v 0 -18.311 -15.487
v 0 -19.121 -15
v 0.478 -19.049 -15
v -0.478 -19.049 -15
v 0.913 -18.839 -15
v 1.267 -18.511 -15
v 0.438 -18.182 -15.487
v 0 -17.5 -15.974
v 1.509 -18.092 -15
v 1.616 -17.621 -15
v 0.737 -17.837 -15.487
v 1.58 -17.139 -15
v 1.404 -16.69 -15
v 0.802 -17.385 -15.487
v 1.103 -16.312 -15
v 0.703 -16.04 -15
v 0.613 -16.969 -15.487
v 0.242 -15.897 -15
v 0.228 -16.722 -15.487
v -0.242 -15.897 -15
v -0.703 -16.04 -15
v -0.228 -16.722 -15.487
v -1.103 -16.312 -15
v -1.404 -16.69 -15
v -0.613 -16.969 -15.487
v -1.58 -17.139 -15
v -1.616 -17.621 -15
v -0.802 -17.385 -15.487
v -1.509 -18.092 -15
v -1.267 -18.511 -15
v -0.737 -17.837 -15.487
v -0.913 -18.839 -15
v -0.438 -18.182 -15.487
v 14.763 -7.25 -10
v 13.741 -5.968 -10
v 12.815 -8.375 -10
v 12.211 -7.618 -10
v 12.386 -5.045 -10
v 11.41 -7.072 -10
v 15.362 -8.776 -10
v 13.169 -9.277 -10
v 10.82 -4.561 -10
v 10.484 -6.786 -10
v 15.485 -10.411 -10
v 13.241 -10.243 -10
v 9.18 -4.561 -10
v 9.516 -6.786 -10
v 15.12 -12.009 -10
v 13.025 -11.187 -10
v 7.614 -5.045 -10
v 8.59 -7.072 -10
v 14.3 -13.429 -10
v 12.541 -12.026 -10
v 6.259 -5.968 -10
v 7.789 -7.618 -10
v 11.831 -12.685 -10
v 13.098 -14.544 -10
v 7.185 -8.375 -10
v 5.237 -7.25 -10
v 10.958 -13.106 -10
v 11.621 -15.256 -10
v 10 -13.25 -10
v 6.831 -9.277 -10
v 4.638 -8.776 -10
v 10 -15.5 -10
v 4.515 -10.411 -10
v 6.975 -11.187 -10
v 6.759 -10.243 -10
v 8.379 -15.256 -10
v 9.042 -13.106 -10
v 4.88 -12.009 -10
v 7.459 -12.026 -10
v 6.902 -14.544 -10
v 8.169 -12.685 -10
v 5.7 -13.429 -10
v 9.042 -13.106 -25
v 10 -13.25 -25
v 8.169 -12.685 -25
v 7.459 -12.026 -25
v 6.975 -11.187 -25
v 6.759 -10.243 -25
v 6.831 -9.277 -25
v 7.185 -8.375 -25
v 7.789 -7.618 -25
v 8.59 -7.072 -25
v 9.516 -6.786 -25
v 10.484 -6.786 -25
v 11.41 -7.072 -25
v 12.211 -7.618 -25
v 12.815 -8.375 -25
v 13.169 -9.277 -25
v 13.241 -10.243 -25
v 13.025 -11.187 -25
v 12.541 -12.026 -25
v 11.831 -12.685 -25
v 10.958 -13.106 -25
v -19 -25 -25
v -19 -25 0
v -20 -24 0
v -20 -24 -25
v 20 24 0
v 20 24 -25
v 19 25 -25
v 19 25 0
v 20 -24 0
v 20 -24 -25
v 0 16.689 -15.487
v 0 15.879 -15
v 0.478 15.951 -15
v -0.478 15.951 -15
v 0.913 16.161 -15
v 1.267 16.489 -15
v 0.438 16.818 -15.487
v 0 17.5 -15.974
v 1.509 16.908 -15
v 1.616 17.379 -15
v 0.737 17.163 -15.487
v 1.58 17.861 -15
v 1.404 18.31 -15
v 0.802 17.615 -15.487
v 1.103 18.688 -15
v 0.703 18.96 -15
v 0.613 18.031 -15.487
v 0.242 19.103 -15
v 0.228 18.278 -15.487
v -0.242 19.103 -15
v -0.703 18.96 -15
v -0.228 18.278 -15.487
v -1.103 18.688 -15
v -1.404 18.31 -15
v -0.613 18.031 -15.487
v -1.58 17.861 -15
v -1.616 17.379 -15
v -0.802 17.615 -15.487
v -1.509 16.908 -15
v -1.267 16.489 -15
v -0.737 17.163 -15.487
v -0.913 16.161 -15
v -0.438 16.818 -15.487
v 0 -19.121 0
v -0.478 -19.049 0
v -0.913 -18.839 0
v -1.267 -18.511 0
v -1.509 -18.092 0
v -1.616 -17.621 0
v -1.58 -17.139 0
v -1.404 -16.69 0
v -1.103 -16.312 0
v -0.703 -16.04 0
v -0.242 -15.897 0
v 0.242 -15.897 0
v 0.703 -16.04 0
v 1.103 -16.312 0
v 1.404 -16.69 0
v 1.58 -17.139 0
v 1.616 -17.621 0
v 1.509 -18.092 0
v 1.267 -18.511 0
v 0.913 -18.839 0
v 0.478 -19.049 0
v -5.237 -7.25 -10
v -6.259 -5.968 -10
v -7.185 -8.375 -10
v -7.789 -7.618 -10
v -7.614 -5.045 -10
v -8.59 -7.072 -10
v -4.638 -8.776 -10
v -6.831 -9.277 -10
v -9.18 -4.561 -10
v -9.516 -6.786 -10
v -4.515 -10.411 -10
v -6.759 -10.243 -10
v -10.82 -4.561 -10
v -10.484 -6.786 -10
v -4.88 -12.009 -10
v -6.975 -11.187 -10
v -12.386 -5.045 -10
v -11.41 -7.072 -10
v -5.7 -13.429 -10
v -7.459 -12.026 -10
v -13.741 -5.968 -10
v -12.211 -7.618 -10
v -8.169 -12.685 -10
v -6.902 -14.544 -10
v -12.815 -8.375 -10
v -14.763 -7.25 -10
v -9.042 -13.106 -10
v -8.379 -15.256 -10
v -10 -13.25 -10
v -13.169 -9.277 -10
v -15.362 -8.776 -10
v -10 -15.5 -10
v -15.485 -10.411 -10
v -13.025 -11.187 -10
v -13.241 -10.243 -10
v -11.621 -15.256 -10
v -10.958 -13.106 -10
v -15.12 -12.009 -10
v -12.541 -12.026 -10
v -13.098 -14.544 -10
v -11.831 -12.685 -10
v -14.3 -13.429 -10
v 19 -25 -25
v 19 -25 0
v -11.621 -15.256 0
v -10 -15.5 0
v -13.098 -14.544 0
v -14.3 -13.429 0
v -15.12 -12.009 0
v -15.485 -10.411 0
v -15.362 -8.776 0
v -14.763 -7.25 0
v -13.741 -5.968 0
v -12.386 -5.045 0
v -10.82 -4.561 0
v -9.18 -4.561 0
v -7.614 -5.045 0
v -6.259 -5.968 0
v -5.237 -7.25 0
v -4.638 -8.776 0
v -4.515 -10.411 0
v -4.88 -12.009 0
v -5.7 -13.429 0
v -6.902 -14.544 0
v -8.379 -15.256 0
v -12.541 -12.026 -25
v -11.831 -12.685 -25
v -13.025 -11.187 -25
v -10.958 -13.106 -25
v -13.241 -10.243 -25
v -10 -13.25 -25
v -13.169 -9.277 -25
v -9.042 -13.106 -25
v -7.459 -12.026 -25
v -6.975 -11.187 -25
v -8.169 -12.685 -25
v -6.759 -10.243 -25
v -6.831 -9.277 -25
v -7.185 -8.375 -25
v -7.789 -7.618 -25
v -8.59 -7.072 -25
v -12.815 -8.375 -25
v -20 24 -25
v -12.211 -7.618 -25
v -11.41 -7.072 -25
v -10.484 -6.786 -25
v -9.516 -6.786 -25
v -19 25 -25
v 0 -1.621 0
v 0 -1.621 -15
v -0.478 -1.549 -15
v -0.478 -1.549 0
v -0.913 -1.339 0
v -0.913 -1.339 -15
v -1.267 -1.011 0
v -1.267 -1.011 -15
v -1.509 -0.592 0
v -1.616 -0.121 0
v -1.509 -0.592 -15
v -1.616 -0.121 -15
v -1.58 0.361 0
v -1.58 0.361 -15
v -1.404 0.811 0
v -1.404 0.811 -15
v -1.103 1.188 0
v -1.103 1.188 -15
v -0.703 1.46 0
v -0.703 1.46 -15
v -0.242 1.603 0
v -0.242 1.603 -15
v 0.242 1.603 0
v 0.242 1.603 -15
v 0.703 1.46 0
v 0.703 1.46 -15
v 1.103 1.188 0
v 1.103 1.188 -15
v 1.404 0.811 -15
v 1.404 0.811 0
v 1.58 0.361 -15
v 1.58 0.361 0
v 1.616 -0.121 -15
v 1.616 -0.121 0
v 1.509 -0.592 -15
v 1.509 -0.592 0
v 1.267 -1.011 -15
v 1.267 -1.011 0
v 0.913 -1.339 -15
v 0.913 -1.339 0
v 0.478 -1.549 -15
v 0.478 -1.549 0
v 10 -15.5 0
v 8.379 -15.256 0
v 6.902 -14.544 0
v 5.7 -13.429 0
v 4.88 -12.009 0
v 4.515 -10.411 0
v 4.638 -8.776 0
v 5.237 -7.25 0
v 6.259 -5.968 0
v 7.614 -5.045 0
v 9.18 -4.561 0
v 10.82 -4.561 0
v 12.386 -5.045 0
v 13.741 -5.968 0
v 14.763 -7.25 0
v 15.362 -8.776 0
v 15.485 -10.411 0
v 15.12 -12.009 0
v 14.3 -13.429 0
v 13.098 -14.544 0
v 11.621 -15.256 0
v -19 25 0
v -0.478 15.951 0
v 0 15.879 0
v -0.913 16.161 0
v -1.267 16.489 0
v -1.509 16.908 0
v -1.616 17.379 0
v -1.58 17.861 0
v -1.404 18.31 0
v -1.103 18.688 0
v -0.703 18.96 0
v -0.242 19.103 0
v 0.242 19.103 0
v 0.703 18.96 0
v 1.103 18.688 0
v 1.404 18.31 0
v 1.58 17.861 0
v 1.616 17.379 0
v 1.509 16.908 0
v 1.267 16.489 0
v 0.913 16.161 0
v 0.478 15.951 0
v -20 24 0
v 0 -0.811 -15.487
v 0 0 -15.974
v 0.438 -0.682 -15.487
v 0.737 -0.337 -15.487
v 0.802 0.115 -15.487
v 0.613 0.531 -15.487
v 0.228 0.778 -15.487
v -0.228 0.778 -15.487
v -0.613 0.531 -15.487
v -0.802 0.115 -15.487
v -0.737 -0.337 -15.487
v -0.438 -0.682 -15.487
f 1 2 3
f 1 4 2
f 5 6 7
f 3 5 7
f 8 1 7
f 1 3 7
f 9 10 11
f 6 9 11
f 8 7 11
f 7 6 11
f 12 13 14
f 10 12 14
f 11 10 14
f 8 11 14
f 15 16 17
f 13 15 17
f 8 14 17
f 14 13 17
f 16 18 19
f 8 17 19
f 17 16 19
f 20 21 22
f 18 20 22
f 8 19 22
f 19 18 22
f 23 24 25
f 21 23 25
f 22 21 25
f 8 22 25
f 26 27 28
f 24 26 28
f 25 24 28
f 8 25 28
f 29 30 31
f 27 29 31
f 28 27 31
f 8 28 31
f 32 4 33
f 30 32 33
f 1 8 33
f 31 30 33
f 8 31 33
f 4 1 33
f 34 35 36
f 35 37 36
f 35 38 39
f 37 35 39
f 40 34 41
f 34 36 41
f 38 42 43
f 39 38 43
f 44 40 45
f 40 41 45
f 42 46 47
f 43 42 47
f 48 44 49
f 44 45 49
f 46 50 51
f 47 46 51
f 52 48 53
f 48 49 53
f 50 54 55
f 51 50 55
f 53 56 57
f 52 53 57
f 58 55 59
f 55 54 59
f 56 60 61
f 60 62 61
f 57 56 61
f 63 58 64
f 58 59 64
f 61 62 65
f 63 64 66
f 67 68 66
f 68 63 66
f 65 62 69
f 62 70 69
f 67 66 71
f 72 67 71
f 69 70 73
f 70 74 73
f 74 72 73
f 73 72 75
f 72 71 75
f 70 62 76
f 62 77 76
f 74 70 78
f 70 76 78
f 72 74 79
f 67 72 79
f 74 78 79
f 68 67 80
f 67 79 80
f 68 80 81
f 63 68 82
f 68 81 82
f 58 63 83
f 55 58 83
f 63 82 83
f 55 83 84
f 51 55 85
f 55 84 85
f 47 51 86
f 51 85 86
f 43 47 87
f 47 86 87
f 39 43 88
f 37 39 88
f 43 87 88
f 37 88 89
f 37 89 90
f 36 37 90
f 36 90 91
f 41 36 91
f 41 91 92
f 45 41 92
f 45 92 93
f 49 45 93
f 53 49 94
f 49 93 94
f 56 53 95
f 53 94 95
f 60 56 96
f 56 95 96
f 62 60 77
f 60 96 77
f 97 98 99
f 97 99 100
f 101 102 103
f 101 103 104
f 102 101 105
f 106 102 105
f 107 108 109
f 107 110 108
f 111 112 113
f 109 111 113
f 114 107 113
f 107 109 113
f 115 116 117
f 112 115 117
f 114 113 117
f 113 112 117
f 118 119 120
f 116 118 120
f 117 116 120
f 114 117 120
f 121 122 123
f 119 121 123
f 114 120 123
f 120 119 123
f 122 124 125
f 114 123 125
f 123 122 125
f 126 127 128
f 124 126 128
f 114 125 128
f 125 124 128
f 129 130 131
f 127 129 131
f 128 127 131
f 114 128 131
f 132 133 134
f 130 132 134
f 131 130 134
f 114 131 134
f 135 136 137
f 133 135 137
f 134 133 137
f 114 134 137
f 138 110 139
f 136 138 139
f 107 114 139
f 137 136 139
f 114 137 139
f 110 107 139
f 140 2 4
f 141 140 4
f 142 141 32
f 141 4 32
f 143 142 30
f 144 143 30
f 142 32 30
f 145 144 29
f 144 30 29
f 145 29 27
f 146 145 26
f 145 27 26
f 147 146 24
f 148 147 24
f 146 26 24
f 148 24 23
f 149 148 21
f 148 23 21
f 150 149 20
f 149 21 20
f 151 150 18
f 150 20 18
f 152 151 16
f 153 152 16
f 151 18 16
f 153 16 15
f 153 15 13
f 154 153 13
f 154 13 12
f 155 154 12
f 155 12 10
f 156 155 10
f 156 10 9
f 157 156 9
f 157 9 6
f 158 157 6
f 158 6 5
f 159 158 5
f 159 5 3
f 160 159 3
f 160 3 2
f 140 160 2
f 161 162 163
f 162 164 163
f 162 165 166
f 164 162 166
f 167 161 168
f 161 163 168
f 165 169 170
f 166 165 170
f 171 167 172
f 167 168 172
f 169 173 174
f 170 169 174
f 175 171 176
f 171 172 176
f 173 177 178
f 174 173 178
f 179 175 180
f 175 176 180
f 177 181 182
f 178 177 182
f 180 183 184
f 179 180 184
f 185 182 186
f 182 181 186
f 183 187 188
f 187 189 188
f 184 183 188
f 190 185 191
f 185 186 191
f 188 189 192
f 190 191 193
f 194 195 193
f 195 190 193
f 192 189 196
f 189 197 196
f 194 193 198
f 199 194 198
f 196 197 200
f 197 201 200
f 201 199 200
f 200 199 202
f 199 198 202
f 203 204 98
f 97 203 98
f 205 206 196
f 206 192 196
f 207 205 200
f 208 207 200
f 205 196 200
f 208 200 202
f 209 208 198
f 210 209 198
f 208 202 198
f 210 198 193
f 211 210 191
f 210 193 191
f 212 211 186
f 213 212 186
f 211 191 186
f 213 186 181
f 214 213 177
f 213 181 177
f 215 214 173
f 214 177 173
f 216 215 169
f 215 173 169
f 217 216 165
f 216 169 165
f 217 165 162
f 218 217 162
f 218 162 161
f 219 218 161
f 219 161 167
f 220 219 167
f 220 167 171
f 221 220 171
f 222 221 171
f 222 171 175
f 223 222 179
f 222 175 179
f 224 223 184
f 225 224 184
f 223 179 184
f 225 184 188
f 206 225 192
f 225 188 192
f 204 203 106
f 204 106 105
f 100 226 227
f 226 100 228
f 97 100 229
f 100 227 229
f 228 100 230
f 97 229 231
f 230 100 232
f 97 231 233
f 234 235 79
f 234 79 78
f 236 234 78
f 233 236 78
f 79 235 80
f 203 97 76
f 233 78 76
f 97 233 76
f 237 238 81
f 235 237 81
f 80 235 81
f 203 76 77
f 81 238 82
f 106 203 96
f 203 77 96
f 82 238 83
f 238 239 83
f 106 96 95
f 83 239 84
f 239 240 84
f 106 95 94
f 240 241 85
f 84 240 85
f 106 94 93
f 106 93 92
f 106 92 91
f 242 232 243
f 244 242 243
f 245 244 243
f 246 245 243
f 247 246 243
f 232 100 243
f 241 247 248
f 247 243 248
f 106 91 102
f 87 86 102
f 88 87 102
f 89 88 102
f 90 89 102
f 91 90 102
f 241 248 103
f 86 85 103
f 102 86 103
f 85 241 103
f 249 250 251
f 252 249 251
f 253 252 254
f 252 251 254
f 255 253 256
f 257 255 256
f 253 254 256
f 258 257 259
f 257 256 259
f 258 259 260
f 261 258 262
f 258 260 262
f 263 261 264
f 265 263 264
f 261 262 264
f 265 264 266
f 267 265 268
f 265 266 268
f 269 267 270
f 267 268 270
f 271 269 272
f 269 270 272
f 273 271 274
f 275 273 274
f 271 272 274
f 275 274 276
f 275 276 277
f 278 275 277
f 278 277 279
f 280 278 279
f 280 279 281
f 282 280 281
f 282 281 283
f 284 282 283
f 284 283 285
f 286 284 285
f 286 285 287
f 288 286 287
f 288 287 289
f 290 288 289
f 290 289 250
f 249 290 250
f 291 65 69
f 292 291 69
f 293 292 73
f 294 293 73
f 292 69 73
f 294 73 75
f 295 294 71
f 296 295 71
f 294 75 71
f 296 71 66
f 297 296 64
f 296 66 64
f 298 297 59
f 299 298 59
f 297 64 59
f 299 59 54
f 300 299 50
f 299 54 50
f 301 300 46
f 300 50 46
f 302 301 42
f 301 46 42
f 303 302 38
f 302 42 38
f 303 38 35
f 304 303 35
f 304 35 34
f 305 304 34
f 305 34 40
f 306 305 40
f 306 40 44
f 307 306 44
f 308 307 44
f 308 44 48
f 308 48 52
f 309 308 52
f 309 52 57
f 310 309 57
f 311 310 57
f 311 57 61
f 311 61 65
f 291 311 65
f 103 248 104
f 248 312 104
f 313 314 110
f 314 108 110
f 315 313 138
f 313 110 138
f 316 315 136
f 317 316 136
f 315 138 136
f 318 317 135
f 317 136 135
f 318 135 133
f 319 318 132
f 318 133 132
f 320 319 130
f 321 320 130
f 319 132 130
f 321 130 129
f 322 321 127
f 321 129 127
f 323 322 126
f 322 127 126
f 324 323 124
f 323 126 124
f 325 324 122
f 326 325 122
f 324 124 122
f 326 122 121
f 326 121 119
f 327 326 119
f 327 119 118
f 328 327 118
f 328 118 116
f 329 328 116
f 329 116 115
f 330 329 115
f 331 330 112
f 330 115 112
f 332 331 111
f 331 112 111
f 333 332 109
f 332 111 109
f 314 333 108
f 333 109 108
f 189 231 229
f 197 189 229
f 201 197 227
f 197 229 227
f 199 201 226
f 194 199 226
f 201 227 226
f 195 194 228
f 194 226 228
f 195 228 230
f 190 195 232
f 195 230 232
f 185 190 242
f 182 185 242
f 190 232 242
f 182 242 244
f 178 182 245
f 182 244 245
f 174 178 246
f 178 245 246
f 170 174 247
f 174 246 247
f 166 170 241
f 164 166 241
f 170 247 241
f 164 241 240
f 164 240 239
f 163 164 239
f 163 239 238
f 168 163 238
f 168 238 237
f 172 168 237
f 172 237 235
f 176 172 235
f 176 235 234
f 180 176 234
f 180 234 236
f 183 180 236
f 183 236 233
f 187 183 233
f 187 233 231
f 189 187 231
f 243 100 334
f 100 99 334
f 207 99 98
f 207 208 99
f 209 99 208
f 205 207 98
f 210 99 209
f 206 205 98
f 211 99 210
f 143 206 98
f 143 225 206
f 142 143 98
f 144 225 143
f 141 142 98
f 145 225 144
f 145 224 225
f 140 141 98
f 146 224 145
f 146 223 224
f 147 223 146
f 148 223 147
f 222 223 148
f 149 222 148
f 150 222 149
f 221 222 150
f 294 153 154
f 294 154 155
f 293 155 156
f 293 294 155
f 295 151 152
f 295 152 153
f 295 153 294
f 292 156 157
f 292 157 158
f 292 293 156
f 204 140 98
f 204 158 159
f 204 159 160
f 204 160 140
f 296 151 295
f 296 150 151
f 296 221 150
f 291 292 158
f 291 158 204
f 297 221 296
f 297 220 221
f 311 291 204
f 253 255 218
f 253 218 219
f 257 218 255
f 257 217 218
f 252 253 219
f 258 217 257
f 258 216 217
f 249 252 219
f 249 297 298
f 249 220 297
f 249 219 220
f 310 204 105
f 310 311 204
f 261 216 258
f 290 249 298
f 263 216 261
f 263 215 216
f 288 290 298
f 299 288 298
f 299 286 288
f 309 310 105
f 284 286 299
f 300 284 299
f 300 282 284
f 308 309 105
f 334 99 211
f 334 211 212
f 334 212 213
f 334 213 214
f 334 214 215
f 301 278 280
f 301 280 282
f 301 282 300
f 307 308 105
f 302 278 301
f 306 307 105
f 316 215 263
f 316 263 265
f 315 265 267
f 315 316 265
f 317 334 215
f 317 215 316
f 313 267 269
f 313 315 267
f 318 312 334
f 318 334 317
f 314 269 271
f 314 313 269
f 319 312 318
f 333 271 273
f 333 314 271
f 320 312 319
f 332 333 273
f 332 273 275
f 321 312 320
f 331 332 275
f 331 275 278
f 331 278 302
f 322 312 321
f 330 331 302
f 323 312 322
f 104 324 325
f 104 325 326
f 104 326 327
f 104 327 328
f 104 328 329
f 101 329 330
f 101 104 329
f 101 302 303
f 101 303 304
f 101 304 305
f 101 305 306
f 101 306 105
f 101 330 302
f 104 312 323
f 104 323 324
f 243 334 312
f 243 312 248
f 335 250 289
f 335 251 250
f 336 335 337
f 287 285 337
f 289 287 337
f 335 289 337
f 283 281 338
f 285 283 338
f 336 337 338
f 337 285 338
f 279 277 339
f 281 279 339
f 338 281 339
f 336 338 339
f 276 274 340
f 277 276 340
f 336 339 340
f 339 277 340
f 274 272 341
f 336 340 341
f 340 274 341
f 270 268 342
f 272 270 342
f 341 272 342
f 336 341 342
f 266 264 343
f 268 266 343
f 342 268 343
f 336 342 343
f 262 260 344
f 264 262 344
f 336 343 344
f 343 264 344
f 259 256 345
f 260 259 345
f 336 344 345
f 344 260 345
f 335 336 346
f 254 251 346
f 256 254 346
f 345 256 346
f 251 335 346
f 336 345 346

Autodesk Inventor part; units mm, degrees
ref_plane "YZ Plane" through (0, 0, 0) normal (1, 0, 0) x (0, 1, 0)
ref_plane "XZ Plane" through (0, 0, 0) normal (0, 1, 0) x (-1, 0, 0)
ref_plane "XY Plane" through (0, 0, 0) normal (0, 0, 1) x (1, 0, 0)
sketch "Esboço1" plane through (0, 0, 0) normal (0, 0, 1) x (1, 0, 0)
  line L0 (-28, 0) -> (28, 0) construction
  line L1 (0, -35) -> (0, 35) construction
  line L2 (-20, 25) -> (20, 25)
  line L3 (20, 25) -> (20, -25)
  line L4 (20, -25) -> (-20, -25)
  line L5 (-20, -25) -> (-20, 25)
  line L6 (-10, 25) -> (-10, -25) construction
  line L7 (10, 25) -> (10, -25) construction
  line L8 (-20, -10) -> (20, -10) construction
  point P0 (0, 0)
  point P1 (-10, -10)
  point P2 (10, -10)
  point P3 (0, -17.5)
  point P4 (0, 0)
  point P5 (0, 17.5)
  dimension "d0" = 40
  dimension "d1" = 50
  dimension "d2" = 20
  dimension "d3" = 15
  dimension "d13" = 35
extrude "Extrusão1" add sketch "Esboço1" against normal blind 25
hole "Furo1" at (-10, -10, 0) at (10, -10, 0) direction (0, 0, -1) diameter 6.5 end through all counterbore diameter 11 counterbore depth 10 clearance for "Socket Head Cap Screw ISO 4762" size "M6" standard "ISO"
hole "Furo2" at (0, -17.5, 0) at (0, 0, 0) at (0, 17.5, 0) direction (0, 0, -1) diameter 3.242 depth 15 tip angle 118 thread size "M4x0.7" class "6H" standard "ISO Metric profile"
chamfer "Chanfro1" distance 1 angle 45 4 edges at (-20, -25, -12.5) (-20, 25, -12.5) (20, 25, -12.5) (20, -25, -12.5)
properties part number "Chapa Suporte Trilho 1" material "Poliacetal WT"
